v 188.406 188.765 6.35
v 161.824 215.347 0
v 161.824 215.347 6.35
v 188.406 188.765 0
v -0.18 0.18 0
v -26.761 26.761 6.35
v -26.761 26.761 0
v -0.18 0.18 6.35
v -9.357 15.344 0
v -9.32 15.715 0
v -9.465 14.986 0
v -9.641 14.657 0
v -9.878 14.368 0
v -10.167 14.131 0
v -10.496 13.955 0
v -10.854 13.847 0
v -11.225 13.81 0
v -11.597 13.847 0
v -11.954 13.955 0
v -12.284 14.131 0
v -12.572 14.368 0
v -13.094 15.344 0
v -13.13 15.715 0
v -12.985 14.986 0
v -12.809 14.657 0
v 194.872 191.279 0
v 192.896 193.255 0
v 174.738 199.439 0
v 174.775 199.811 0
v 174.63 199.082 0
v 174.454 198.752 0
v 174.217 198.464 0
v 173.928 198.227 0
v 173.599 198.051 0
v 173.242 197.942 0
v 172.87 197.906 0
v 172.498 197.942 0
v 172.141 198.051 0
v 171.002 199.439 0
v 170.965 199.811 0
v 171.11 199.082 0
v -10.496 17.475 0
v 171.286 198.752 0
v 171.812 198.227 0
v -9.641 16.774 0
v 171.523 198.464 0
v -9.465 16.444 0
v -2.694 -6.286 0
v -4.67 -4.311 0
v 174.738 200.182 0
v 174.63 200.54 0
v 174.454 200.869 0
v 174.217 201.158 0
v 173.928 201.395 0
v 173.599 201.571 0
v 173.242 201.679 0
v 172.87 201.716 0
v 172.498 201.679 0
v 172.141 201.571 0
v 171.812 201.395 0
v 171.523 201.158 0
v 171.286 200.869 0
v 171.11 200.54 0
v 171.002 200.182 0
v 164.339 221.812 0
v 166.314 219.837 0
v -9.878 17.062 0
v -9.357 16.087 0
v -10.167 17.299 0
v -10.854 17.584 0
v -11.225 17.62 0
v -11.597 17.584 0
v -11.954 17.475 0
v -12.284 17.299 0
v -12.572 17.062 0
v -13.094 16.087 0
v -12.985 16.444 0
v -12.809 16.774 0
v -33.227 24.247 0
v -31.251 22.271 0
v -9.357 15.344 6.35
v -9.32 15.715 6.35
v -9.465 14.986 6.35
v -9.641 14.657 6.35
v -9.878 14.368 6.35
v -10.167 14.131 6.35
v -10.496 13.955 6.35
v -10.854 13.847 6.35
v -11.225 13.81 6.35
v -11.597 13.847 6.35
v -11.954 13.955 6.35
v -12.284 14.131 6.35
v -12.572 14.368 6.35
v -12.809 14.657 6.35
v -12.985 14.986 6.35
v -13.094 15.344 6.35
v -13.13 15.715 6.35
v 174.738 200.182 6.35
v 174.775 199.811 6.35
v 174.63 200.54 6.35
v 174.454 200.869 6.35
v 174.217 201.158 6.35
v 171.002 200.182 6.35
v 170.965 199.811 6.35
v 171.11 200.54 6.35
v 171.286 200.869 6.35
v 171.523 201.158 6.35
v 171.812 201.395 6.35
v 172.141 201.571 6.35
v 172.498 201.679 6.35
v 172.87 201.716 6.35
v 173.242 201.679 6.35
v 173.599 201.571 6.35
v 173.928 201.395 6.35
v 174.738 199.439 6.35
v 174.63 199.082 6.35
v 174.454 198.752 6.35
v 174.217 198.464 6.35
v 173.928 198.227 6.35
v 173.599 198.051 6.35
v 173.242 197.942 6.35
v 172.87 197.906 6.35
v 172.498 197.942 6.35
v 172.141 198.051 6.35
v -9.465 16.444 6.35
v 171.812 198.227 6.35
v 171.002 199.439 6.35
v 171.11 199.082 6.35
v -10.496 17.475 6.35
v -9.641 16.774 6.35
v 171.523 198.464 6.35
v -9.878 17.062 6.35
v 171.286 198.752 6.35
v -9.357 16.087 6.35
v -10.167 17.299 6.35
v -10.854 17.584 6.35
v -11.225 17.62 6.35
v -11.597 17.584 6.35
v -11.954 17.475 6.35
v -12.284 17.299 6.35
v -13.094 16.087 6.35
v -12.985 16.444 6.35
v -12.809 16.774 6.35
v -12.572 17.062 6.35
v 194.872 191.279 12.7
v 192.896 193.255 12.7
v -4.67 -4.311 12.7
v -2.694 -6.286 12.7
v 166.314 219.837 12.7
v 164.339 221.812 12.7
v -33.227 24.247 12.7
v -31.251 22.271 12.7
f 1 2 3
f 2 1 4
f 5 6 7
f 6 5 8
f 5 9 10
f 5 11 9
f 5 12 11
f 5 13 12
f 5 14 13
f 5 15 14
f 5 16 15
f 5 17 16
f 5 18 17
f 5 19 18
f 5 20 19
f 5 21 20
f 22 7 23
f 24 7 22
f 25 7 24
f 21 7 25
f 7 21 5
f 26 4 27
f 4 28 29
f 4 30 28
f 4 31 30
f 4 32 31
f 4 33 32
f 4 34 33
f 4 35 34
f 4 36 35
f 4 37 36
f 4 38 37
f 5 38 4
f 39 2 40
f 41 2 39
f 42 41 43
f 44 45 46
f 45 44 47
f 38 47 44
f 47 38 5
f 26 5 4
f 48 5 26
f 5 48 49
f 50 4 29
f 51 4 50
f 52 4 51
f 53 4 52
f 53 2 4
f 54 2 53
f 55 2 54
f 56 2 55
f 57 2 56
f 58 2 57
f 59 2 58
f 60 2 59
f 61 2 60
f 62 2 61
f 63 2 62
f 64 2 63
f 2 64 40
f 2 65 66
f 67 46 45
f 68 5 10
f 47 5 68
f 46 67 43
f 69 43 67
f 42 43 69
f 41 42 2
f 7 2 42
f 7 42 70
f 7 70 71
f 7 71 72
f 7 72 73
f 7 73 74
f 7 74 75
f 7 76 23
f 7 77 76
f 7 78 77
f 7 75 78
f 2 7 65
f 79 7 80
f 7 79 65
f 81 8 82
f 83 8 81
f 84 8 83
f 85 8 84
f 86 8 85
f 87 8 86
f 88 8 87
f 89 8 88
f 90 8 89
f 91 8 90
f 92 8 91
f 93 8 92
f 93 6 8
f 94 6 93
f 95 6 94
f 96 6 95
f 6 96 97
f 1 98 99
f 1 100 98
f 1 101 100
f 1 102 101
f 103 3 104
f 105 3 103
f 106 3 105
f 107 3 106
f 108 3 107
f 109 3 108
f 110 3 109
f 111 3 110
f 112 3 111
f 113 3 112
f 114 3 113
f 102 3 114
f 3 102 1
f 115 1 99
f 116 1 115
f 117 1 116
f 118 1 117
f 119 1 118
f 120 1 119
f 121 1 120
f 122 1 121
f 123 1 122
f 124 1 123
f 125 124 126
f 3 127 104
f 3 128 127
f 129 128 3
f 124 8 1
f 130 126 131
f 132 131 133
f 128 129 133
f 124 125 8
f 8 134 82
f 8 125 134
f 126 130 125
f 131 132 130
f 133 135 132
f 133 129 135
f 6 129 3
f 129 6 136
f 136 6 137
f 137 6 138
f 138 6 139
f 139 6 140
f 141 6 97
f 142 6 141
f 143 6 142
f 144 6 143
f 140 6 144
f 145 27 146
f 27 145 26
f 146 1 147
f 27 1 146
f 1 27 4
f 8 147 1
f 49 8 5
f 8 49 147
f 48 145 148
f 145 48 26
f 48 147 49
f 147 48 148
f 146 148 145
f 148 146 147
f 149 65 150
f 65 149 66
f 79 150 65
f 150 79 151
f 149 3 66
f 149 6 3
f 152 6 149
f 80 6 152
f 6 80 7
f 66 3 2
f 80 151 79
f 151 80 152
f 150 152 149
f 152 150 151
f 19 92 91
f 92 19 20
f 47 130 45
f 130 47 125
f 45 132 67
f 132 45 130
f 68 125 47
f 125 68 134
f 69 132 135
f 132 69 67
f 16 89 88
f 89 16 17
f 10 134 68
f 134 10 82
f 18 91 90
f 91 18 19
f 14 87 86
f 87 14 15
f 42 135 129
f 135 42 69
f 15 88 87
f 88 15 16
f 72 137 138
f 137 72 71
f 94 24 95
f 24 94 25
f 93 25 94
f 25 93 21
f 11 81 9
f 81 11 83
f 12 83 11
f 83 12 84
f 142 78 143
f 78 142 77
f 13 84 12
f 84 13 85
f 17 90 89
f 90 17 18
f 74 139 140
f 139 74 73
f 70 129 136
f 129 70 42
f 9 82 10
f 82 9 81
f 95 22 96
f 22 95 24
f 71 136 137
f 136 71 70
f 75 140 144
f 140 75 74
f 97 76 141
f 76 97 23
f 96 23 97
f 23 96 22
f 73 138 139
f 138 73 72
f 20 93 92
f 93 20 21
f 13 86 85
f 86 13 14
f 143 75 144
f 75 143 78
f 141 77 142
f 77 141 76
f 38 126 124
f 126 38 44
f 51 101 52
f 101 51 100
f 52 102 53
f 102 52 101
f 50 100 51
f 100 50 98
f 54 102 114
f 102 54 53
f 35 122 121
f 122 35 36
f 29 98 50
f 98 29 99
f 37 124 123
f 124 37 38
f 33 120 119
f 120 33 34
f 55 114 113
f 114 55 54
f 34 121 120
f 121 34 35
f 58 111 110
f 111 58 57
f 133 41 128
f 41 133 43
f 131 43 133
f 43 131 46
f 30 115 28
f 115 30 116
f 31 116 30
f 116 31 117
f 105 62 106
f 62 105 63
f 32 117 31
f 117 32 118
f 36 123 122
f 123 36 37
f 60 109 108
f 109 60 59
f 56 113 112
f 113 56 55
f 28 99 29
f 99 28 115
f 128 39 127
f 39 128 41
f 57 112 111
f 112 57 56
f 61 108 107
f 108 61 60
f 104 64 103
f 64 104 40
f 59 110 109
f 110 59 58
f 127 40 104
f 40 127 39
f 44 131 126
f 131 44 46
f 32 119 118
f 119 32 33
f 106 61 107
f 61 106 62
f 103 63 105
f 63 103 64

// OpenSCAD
// file: _cat_door_u_liner_lib.scad
// Cat door U-shaped liner - shared geometry.
// Fits into a rectangular box cut into a door, lining the bottom and
// two sides with a thin wall so a smaller insert seats snugly in the gap.
//
// Flanges at the front and/or back cap the ends, sitting flush against
// the door's face and overlapping the cut edge to hide it.
//
// PRINTABILITY: a single piece with a 90-degree bend (leg+rail) can't be
// oriented to avoid supports, because the leg's flange overhang needs
// rotation about one axis while the rail's needs rotation about the other.
// So the part is split into 3 straight pieces - left leg, right leg, and
// the full-width bottom rail - each printable with zero overhangs, joined
// with a peg-and-hole press fit at the two corners. The rail (10.5in =
// 266.7mm) is also individually longer than a 256mm bed, so it's printed
// at a 45-degree diagonal, which brings its footprint to ~219x219mm.
//
// See cat_door_u_liner_leg_left.scad / _leg_right.scad / _rail.scad, which
// include this file and call the render_*() entry points. This file has no
// directly renderable geometry of its own (build_stl.py skips files
// starting with "_").

// ---- Parameters (inches) ----
door_depth      = 1.5;   // door thickness (liner spans this, Z)
box_width       = 10.5;  // width of the cutout in the door (X)
box_height      = 7.75;  // height of the cutout in the door (Y)
wall            = 0.25;  // thickness of the liner material (the gap it fills)

flange_front    = true;  // add a flange on the front face
flange_back     = true;  // add a flange on the back face
flange_overlap  = 0.25;  // how far the flange extends past the cut edge
flange_thick    = 0.1;   // flange thickness (Z), kept small/low-profile

screw_holes     = true;  // add mounting screw holes through the two legs
screw_hole_dia  = 0.19;  // clearance diameter for the screw shank (~#8 screw)
screw_hole_inset = 0.5;  // distance in from the tip (open end) of each leg

countersink       = true; // recess for a flat/flush screw head, on the inner face
countersink_dia   = 0.36; // head diameter (~#8 flat-head screw)
countersink_depth = 0.1;  // how deep the taper cuts into the leg (< wall)

// Corner joint: a round peg on each leg presses into a hole in the rail.
// The peg runs along the leg's own length, so it's a horizontal, in-plane
// extension of the print (no added overhang) rather than a feature that
// has to stick straight up off the bed. hole is slightly smaller than the
// peg for a firm friction/snap fit - sand the peg or reprint with
// adjusted diameters if it's too tight/loose.
joint_peg_dia   = 0.16;
joint_hole_dia  = 0.15;
joint_peg_height = 0.25;
joint_hole_depth = 0.32;

rail_print_angle = 45; // diagonal rotation so the rail fits a 256mm bed

eps = 0.01; // small overlap so parts fuse into one solid in unions

// ---- Shared sub-features ----

// Horizontal screw hole through one leg only (not the flange), so a screw
// bites into the solid door beside the cutout. Bored outward through the
// leg's outer face (x_start), centered on the leg's depth (Z), clear of
// the flanges which only occupy the ends of the Z range.
module screw_hole_leg(x_start, y_pos) {
    translate([x_start - eps, y_pos, door_depth / 2])
        rotate([0, 90, 0])
            cylinder(h = wall + 2 * eps, d = screw_hole_dia, $fn = 32);
}

// Countersink taper on the inner face (box-interior side) of a leg, where
// the screw head seats. dir = -1 for the left leg (inner face is the leg's
// high-x side, cone narrows toward -x); dir = +1 for the right leg (inner
// face is the low-x side, cone narrows toward +x).
module countersink_leg(x_face, y_pos, dir) {
    d1 = (dir < 0) ? screw_hole_dia : countersink_dia;
    d2 = (dir < 0) ? countersink_dia : screw_hole_dia;
    x0 = (dir < 0) ? x_face - countersink_depth : x_face;
    translate([x0, y_pos, door_depth / 2])
        rotate([0, 90, 0])
            cylinder(h = countersink_depth, d1 = d1, d2 = d2, $fn = 32);
}

// ---- Leg (a straight bar; the rail owns the corner squares, so a leg's
// own Y range starts at "wall", not 0) ----
// Built for the left side; the right leg is this shape mirrored about the
// box's centerline, which correctly flips the screw hole/countersink too.
module leg_shape(dir) {
    if (dir > 0) {
        translate([box_width, 0, 0]) mirror([1, 0, 0]) leg_shape(-1);
    } else {
        y0 = wall;
        y1 = box_height;
        h = y1 - y0;
        difference() {
            union() {
                translate([0, y0, 0]) cube([wall, h, door_depth]);
                if (flange_front)
                    translate([-flange_overlap, y0, -flange_thick])
                        cube([wall + flange_overlap, h, flange_thick + eps]);
                if (flange_back)
                    translate([-flange_overlap, y0, door_depth - eps])
                        cube([wall + flange_overlap, h, flange_thick + eps]);

                // Peg extending off the bottom face, into the rail's mortise
                translate([wall / 2, y0 - joint_peg_height, door_depth / 2])
                    rotate([-90, 0, 0])
                        cylinder(h = joint_peg_height + eps, d = joint_peg_dia, $fn = 32);
            }

            if (screw_holes) {
                y_pos = box_height - screw_hole_inset;
                screw_hole_leg(0, y_pos);
                if (countersink) countersink_leg(wall, y_pos, -1);
            }
        }
    }
}

// ---- Rail (full width; owns both bottom corner squares plus a mortise
// hole at each end that receives the matching leg's peg) ----
module rail_hole_at(x) {
    translate([x, wall - joint_hole_depth, door_depth / 2])
        rotate([-90, 0, 0])
            cylinder(h = joint_hole_depth + eps, d = joint_hole_dia, $fn = 32);
}

module rail_shape() {
    difference() {
        union() {
            cube([box_width, wall, door_depth]);
            if (flange_front)
                translate([-flange_overlap, -flange_overlap, -flange_thick])
                    cube([box_width + 2 * flange_overlap, wall + flange_overlap, flange_thick + eps]);
            if (flange_back)
                translate([-flange_overlap, -flange_overlap, door_depth - eps])
                    cube([box_width + 2 * flange_overlap, wall + flange_overlap, flange_thick + eps]);
        }

        rail_hole_at(wall / 2);
        rail_hole_at(box_width - wall / 2);
    }
}

// ---- Print-orientation wrappers ----
// Each piece is rotated so its "spine" (the inner face shared with the box
// opening) sits on the bed and the flange tips are at the top - going up,
// the cross-section only ever shrinks, so nothing overhangs and no
// supports are needed.
mm_per_inch = 25.4;

// The left and right legs are the same physical part: the flanges are
// front/back symmetric and the screw hole/countersink are centered on that
// same axis, so a 180-degree flip about the leg's own length swaps "left"
// for "right". One file, printed twice - flip one copy end-for-end when
// installing it on the other side of the door.
module render_leg() {
    scale([mm_per_inch, mm_per_inch, mm_per_inch])
        translate([0, 0, wall])
            rotate([0, 90, 0])
                leg_shape(-1);
}

module render_rail() {
    z_shift = wall;
    scale([mm_per_inch, mm_per_inch, mm_per_inch])
        rotate([0, 0, rail_print_angle])
            translate([0, 0, z_shift])
                rotate([-90, 0, 0])
                    rail_shape();
}
// main file
// Bottom rail of the cat door U liner (full 10.5in width). Pre-oriented
// for zero-overhang printing and rotated diagonally to fit a 256mm bed -
// just import and slice.
// See _cat_door_u_liner_lib.scad for parameters and the other pieces.
include <_cat_door_u_liner_lib.scad>
render_rail();
